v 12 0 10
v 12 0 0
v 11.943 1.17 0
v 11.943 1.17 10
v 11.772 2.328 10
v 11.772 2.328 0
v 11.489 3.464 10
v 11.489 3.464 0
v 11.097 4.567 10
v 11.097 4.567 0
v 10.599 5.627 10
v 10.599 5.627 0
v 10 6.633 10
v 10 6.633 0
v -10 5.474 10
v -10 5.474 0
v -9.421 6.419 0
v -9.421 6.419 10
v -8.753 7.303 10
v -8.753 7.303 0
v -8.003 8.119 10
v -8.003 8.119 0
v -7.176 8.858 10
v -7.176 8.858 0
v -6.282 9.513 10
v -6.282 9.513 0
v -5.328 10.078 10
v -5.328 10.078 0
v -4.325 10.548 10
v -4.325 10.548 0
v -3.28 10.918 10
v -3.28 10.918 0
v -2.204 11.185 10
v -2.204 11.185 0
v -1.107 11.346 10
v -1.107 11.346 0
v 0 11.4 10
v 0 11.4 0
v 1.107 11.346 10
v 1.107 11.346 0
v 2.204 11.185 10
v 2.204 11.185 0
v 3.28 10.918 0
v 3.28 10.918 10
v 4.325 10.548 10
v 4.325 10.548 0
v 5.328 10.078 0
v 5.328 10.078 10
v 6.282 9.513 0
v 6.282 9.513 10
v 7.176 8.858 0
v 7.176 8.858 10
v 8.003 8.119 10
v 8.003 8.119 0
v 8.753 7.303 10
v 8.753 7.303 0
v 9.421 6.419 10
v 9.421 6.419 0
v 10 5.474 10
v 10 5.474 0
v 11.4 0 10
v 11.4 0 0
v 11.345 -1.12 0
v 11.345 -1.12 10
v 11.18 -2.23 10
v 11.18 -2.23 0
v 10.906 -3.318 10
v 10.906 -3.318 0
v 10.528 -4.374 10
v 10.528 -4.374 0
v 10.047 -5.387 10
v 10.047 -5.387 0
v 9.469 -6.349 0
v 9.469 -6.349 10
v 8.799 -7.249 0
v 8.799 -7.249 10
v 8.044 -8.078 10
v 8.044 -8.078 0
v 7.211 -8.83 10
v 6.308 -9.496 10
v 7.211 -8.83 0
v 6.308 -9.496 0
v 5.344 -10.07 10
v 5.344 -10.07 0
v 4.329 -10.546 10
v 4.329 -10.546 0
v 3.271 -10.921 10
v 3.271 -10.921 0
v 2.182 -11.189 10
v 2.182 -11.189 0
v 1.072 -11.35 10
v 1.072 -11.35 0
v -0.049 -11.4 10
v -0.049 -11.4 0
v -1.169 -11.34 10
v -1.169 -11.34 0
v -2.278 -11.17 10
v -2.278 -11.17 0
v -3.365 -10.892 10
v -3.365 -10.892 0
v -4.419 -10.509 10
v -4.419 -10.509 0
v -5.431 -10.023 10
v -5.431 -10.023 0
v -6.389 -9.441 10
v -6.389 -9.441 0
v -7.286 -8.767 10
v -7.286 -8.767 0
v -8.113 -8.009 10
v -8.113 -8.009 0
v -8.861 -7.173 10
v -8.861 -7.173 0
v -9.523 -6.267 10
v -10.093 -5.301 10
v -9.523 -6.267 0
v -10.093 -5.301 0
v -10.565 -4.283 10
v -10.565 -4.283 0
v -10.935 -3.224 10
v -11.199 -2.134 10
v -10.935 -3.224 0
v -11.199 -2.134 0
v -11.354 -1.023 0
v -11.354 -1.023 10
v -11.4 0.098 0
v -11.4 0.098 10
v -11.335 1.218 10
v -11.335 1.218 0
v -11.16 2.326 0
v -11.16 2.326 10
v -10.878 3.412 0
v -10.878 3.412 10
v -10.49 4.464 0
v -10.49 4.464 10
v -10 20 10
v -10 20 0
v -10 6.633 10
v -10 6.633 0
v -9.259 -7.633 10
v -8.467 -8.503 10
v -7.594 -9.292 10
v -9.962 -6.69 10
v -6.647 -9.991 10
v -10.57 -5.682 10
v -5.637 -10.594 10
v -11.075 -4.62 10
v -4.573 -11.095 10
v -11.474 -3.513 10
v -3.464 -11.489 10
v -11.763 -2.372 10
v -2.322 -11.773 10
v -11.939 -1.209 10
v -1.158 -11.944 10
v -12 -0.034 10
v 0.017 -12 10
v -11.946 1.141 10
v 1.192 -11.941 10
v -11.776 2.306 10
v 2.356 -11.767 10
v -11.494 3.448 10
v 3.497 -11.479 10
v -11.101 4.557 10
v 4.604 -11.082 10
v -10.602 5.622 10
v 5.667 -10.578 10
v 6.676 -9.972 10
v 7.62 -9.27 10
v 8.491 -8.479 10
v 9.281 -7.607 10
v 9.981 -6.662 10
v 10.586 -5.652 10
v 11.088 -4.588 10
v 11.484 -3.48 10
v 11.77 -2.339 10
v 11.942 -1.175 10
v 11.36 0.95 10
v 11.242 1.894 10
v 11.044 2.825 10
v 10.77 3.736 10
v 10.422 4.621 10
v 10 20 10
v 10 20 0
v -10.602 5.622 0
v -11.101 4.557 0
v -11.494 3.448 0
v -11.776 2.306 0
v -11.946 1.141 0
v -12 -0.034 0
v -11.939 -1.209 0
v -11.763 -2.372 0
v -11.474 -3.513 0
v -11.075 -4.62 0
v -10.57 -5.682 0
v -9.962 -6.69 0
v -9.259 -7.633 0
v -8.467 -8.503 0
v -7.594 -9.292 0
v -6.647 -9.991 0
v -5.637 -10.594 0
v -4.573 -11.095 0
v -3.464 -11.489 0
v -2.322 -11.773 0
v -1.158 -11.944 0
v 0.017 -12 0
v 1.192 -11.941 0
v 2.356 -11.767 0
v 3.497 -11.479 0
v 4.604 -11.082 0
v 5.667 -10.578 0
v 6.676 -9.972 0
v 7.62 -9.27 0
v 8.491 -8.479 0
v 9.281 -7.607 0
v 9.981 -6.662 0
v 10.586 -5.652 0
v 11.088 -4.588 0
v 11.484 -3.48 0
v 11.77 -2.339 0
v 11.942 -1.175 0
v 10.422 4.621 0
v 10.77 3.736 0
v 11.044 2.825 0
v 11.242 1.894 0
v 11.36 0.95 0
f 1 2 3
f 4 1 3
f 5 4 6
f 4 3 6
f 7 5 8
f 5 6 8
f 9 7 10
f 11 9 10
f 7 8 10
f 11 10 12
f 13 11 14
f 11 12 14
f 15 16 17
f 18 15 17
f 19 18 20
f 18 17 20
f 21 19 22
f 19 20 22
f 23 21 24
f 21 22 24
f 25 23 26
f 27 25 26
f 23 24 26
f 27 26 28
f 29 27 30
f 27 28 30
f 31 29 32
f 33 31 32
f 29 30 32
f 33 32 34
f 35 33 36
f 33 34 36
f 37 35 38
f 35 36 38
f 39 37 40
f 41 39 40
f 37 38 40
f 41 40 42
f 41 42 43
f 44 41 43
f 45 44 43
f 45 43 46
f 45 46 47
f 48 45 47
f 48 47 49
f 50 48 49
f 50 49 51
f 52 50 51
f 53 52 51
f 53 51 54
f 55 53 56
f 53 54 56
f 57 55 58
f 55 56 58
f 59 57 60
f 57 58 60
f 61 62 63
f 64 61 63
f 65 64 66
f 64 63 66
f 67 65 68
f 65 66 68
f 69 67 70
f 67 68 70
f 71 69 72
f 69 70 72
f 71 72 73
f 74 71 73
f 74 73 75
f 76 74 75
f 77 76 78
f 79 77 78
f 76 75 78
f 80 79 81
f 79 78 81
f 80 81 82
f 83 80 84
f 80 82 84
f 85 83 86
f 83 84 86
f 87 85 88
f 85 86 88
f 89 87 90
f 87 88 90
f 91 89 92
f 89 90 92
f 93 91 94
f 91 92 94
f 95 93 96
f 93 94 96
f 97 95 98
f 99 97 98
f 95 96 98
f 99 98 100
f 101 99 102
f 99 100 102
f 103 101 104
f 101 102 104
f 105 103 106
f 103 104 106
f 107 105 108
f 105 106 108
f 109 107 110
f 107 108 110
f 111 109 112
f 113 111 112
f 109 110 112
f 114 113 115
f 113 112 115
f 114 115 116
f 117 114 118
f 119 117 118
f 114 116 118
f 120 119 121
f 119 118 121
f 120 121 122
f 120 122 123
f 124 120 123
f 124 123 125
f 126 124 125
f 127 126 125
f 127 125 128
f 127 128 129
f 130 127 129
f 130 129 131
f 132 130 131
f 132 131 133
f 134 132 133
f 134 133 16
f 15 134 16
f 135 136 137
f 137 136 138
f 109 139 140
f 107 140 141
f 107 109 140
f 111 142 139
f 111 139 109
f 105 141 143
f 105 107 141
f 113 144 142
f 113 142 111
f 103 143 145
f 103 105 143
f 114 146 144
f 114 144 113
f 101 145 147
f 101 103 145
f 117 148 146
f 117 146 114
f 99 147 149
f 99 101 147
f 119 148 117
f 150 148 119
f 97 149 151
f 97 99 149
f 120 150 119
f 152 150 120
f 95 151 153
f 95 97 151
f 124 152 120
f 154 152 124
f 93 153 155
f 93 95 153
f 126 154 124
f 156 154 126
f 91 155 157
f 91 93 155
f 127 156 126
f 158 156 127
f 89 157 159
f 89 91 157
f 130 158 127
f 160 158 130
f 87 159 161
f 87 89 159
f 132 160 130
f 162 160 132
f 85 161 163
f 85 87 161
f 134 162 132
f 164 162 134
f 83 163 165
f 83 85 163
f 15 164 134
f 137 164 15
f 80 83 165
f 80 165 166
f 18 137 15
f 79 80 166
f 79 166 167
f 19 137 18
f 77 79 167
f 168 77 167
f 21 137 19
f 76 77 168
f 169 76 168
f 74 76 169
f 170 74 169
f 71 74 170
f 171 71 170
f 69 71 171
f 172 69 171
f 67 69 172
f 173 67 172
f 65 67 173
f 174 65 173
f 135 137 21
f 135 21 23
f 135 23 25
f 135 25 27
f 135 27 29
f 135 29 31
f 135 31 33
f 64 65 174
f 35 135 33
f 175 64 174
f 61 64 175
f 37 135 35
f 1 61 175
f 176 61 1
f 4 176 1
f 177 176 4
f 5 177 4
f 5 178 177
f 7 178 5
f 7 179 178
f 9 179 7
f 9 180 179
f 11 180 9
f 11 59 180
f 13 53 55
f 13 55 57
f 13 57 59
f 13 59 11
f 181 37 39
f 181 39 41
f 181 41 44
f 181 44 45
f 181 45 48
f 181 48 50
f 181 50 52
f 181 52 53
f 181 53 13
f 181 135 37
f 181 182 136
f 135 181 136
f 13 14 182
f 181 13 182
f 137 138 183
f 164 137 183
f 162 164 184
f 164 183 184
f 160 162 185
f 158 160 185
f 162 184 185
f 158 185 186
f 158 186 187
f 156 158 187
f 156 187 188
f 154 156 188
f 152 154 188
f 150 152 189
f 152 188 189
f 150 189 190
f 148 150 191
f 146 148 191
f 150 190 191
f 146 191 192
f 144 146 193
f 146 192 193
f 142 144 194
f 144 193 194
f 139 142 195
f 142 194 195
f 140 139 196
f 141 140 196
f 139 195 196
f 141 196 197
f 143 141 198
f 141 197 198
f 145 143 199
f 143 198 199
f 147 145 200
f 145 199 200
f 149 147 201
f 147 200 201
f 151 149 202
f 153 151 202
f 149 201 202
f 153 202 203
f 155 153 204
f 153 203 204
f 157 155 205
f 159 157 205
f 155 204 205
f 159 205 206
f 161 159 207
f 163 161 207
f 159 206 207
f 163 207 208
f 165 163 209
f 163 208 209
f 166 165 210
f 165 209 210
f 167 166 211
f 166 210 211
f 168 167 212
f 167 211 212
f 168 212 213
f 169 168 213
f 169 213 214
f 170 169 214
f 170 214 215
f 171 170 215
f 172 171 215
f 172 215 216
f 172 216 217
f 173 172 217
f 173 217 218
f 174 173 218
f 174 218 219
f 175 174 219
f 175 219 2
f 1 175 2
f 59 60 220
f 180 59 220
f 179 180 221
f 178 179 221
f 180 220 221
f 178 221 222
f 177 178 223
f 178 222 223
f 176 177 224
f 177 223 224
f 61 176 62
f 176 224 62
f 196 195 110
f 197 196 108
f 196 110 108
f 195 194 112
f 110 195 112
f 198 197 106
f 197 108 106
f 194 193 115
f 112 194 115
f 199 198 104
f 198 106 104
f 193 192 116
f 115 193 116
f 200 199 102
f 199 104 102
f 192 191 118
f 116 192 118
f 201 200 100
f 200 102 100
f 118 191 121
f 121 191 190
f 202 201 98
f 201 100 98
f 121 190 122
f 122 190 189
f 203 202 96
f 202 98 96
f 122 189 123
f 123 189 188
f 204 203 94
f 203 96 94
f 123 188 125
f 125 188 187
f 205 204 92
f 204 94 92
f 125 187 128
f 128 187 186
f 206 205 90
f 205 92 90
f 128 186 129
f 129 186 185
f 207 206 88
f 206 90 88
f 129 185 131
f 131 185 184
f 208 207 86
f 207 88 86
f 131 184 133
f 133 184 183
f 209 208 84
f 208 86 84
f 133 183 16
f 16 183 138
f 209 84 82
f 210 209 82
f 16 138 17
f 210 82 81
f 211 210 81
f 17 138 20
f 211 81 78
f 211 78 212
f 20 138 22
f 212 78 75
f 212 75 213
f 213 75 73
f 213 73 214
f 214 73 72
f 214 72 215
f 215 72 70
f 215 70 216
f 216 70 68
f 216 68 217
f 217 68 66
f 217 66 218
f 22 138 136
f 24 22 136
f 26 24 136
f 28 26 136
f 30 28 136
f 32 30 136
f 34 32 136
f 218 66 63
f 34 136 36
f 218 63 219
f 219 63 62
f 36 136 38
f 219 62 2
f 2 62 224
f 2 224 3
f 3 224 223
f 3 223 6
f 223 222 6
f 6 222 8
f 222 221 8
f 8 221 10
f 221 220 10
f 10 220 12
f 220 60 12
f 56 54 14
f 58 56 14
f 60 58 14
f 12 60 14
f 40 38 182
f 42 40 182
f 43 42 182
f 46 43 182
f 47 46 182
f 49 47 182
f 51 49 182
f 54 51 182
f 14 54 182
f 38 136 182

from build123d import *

# Parameters (mm, degrees)
F1_DEPTH = 10


with BuildPart() as f1:
    # F0 (on Top) → F1 (new body)
    with BuildSketch(Plane.XY):
        with BuildLine():
            ThreePointArc((10.0000002235, 5.473572465), (11.0444556803, 2.8248891529), (11.4, 0))
            ThreePointArc((11.4, 0), (-2.8248896039, -11.0444555649), (-9.9999997765, 5.4735732817))
            Line((-9.9999997765, 5.4735732817), (-9.9999997765, 6.6332499177))
            ThreePointArc((-9.9999997765, 6.6332499177), (-3.4641018087, -11.4891252347), (12, 0))
            ThreePointArc((12, 0), (11.4891253514, 3.4641014216), (10.0000002235, 6.6332492437))
            Line((10.0000002235, 6.6332492437), (10.0000002235, 5.473572465))
        make_face()
        with BuildLine():
            ThreePointArc((-9.9999997765, 5.4735732817), (4.655e-07, 11.4), (10.0000002235, 5.473572465))
            Line((10.0000002235, 5.473572465), (10.0000002235, 6.6332492437))
            ThreePointArc((10.0000002235, 6.6332492437), (4.044e-07, 12), (-9.9999997765, 6.6332499177))
            Line((-9.9999997765, 6.6332499177), (-9.9999997765, 5.4735732817))
        make_face()
        with BuildLine():
            ThreePointArc((-9.9999997765, 6.6332499177), (4.044e-07, 12), (10.0000002235, 6.6332492437))
            Line((10.0000002235, 6.6332492437), (10.0000002235, 20))
            Line((10.0000002235, 20), (-9.9999997765, 20))
            Line((-9.9999997765, 20), (-9.9999997765, 6.6332499177))
        make_face()
    extrude(amount=F1_DEPTH)


solid = f1.part
